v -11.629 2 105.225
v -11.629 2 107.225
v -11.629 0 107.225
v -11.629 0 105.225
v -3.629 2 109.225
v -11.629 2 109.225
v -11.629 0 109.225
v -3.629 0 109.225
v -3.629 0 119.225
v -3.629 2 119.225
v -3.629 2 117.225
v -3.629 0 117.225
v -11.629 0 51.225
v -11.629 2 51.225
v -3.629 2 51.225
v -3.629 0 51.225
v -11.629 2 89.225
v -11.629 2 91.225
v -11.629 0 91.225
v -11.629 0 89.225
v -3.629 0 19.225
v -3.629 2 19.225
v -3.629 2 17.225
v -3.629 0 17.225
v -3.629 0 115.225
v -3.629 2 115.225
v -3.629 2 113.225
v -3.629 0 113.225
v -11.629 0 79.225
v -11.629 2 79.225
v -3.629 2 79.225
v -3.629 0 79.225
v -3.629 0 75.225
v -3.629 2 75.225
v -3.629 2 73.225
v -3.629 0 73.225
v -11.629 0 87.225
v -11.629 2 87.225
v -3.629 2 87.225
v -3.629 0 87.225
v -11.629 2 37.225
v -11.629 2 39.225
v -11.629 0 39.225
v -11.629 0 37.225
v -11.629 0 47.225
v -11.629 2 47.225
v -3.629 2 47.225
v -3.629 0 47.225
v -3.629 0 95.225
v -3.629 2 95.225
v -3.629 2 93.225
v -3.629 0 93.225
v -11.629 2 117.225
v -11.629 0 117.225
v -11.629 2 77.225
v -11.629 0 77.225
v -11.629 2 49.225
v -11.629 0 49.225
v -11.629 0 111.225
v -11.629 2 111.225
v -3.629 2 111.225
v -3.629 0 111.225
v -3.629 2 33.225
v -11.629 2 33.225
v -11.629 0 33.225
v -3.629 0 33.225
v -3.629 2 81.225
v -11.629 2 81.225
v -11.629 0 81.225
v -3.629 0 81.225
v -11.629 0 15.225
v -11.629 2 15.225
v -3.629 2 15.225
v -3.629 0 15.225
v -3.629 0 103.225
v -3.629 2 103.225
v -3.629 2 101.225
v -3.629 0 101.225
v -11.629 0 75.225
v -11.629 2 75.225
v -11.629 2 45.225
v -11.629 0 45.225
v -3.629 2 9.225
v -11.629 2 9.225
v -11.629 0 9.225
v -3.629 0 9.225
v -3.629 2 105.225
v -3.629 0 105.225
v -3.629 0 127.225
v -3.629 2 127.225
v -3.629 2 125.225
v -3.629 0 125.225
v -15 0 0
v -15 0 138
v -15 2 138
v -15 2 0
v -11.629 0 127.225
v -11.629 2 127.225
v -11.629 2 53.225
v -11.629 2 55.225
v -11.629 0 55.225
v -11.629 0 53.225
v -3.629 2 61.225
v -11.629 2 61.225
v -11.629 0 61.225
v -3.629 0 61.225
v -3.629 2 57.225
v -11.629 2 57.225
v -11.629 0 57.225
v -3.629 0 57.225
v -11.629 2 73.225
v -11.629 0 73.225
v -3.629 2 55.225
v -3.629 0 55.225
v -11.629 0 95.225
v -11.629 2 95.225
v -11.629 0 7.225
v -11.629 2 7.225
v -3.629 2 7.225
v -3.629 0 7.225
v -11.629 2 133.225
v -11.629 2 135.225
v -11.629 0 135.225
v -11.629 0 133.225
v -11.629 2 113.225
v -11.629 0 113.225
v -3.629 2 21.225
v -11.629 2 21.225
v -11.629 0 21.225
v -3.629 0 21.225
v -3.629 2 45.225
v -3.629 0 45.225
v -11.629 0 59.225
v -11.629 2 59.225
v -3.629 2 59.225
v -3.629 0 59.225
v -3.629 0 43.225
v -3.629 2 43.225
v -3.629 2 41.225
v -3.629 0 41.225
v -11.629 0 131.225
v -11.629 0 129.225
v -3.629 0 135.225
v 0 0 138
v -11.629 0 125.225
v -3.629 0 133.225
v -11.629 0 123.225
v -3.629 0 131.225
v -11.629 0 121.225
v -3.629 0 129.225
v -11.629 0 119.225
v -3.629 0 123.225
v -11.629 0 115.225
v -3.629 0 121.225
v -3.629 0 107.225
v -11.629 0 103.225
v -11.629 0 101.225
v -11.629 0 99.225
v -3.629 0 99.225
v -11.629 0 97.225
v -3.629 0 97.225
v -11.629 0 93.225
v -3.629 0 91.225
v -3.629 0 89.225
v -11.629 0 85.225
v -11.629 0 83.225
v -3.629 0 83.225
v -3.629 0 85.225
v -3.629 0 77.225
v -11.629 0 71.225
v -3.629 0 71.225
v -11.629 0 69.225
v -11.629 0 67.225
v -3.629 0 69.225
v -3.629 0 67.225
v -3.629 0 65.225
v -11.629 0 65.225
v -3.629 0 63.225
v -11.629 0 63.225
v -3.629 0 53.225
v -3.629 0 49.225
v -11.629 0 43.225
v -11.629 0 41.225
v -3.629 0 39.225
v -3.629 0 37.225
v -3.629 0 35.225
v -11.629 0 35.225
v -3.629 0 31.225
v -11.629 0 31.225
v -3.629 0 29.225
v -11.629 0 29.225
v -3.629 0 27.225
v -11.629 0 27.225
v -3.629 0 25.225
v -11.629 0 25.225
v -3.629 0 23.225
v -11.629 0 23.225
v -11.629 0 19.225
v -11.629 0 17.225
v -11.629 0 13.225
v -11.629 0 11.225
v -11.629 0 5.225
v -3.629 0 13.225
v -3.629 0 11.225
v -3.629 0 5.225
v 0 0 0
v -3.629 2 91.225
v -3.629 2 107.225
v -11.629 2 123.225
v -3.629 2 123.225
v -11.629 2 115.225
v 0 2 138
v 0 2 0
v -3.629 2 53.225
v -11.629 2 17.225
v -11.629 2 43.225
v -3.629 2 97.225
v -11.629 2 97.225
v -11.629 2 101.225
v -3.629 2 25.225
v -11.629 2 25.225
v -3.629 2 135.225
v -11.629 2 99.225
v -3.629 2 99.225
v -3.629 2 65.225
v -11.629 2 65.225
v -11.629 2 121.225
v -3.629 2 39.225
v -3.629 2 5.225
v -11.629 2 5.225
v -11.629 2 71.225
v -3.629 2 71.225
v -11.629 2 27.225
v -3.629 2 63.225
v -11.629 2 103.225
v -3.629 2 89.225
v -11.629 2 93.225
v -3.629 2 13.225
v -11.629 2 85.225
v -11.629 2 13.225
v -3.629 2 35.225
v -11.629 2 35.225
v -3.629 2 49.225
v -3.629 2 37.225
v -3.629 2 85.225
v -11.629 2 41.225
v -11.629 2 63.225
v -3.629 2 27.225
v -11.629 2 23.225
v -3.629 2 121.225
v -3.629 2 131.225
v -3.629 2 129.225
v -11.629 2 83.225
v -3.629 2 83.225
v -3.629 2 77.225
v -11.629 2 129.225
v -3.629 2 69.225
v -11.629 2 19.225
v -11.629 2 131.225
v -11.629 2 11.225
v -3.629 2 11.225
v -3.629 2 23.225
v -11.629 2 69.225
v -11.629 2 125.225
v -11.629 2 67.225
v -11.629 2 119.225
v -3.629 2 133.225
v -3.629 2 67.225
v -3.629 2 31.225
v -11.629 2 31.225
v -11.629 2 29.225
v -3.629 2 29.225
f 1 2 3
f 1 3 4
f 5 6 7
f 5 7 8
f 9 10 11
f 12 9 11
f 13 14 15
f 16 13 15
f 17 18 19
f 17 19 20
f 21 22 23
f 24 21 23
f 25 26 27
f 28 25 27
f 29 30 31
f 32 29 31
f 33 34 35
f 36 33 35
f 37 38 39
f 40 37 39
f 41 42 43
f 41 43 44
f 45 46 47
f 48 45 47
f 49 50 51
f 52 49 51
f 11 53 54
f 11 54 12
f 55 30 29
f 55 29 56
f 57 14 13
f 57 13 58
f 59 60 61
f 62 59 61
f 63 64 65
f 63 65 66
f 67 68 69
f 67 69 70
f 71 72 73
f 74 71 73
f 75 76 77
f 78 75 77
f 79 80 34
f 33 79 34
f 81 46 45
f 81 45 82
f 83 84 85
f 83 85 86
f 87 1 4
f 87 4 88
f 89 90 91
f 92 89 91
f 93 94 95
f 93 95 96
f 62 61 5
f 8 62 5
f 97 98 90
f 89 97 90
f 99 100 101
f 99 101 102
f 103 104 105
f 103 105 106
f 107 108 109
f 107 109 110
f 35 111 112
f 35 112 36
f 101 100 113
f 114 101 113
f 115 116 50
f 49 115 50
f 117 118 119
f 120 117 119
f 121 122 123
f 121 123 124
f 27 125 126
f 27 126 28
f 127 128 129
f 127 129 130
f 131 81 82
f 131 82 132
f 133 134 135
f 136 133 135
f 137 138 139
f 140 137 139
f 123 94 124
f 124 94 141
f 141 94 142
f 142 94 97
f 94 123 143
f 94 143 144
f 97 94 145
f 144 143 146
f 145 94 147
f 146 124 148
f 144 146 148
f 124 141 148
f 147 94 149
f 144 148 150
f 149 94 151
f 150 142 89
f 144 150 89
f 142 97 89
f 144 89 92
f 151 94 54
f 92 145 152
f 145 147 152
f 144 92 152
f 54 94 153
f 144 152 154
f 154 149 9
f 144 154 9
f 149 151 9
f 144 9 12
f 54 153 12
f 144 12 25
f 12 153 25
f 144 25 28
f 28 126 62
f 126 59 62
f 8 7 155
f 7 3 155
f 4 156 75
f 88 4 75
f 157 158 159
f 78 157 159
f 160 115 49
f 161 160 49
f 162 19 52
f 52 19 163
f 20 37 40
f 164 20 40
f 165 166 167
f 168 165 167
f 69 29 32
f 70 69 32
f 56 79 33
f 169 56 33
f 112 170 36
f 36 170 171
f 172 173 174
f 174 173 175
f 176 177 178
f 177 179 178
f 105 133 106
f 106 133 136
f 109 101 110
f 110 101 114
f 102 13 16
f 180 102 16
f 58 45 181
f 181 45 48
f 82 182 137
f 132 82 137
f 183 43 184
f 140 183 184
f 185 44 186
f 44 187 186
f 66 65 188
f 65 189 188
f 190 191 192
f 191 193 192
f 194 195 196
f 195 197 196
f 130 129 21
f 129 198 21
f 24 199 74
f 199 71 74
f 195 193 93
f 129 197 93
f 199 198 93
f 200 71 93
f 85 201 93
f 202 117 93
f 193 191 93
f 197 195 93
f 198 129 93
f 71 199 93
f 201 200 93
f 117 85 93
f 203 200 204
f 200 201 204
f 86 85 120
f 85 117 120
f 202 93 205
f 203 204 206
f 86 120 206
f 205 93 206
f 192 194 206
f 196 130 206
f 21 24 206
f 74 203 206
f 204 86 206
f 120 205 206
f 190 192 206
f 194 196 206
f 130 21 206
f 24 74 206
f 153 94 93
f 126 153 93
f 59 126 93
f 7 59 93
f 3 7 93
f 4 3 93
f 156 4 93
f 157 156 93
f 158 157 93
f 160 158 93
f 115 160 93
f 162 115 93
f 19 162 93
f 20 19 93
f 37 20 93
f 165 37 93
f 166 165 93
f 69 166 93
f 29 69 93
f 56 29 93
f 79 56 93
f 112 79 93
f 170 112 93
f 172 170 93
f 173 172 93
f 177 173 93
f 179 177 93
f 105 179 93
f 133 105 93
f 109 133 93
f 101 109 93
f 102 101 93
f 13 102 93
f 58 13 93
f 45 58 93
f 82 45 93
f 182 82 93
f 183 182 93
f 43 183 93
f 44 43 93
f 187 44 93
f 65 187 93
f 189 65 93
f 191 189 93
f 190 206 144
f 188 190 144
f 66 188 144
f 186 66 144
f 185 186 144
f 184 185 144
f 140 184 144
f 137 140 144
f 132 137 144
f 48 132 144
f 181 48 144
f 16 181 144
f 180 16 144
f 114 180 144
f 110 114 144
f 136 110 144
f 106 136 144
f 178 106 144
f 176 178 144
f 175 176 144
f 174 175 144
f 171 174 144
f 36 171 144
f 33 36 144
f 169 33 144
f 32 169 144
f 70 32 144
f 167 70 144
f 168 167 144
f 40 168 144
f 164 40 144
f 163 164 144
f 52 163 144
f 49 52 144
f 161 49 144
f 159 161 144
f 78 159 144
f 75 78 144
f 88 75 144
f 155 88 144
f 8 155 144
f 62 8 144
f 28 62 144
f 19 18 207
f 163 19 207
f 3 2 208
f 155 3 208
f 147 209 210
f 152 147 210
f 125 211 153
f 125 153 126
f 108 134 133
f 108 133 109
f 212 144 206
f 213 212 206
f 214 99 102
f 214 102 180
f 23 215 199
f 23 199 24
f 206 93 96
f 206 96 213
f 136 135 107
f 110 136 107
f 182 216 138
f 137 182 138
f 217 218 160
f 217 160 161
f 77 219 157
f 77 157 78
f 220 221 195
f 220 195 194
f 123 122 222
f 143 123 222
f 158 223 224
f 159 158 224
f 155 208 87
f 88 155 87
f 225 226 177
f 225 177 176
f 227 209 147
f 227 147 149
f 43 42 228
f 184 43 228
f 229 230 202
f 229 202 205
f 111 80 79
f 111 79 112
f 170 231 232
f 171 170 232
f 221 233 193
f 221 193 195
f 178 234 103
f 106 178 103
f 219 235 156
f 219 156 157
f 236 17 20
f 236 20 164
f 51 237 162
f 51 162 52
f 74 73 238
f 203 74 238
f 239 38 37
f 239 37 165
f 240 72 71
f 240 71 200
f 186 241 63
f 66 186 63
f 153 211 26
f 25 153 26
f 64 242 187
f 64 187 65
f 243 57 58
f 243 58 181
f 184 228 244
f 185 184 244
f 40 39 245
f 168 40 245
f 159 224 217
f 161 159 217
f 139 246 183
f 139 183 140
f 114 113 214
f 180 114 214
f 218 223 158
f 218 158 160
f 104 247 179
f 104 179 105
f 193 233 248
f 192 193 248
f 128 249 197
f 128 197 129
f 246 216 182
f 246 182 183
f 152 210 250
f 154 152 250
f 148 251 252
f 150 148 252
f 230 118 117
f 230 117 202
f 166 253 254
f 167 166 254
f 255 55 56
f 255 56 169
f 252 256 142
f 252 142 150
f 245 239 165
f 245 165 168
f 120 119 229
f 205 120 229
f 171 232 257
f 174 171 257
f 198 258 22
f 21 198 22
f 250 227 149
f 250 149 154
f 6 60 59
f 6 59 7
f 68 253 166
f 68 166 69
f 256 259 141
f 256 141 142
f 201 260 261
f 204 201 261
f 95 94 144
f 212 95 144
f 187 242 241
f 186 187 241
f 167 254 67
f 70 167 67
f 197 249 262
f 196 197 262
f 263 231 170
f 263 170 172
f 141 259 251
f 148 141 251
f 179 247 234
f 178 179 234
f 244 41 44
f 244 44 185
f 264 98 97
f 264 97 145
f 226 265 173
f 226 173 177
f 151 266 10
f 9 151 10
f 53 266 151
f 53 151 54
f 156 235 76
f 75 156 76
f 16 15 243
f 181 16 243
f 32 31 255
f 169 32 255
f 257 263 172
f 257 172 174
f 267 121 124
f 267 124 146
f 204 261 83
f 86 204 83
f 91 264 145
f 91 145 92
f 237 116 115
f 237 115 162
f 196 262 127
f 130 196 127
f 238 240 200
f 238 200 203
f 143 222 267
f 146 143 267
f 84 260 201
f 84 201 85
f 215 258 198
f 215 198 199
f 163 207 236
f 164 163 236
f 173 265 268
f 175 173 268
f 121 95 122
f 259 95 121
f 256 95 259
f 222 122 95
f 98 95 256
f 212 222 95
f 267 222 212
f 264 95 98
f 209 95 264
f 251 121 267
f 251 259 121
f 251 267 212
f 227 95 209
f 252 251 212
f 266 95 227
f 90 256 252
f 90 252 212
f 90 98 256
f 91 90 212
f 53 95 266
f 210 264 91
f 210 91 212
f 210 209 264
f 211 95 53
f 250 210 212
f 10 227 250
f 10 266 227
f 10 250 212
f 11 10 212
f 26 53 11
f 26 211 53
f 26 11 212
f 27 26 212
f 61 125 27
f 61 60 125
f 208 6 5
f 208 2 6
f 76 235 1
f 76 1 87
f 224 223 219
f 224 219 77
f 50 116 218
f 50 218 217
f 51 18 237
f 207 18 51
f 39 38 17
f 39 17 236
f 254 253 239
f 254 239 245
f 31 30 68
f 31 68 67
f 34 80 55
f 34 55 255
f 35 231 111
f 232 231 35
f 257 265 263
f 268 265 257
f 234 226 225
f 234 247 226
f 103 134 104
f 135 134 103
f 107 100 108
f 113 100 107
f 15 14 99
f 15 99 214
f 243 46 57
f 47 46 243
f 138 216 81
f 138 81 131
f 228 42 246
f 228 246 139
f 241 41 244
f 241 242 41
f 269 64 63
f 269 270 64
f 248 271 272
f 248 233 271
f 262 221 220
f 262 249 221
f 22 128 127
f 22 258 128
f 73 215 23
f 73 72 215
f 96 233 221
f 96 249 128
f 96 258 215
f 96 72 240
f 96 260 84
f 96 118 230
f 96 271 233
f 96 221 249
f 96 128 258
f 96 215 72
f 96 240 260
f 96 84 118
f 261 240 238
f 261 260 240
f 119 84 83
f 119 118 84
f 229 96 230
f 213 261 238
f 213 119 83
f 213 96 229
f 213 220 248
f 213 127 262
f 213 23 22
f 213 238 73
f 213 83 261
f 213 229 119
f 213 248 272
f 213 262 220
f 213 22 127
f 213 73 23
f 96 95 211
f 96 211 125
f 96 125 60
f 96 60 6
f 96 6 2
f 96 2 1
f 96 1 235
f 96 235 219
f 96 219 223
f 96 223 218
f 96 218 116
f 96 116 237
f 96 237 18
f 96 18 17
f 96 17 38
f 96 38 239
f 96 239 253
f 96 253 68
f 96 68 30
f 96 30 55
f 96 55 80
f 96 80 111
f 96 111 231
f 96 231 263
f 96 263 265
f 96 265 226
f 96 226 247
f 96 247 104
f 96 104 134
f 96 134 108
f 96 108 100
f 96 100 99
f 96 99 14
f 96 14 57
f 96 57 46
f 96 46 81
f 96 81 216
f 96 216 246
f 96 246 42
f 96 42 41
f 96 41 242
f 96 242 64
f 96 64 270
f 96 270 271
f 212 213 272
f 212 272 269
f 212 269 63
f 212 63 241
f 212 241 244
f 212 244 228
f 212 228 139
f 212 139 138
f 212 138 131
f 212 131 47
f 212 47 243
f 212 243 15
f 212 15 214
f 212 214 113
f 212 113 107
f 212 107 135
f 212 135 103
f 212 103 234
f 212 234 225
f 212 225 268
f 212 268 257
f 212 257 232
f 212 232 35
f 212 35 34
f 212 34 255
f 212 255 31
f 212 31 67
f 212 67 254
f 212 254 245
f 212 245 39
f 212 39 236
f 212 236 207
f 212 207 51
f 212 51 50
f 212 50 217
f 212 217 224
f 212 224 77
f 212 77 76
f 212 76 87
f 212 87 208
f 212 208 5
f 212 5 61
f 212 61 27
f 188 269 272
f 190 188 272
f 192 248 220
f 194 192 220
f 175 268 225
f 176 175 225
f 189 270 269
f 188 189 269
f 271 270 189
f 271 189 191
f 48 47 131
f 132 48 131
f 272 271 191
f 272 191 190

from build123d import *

# Parameters (mm, degrees)
SKETCH1_W           = 15
SKETCH1_H           = 138
BOSS_EXTRUDE1_DEPTH = 2
SKETCH2_W           = 8
SKETCH2_H           = 2
CUT_EXTRUDE1_DEPTH  = 139.827230758
LPATTERN1_COUNT     = 33
LPATTERN1_PITCH     = 4


with BuildPart() as part:
    # Sketch1 → Boss-Extrude1 (new body)
    with BuildSketch(Plane(origin=(0, 0, 0), x_dir=(1, 0, 0), z_dir=(0, 1, 0))):
        with Locations((-7.5, -69)):
            Rectangle(SKETCH1_W, SKETCH1_H)
    extrude(amount=BOSS_EXTRUDE1_DEPTH)

    # Sketch2 → Cut-Extrude1 (cut, through all)
    with BuildSketch(Plane(origin=(0, 2, 0), x_dir=(1, 0, 0), z_dir=(0, 1, 0))):
        with Locations((-7.629218666, -6.225153301)):
            Rectangle(SKETCH2_W, SKETCH2_H)
    cut_extrude1 = extrude(amount=-CUT_EXTRUDE1_DEPTH, mode=Mode.SUBTRACT)

    # LPattern1: Cut-Extrude1 ×33
    with Locations(*[(0, 0, i * LPATTERN1_PITCH) for i in range(1, LPATTERN1_COUNT)]):
        add(cut_extrude1, mode=Mode.SUBTRACT)


solid = part.part
